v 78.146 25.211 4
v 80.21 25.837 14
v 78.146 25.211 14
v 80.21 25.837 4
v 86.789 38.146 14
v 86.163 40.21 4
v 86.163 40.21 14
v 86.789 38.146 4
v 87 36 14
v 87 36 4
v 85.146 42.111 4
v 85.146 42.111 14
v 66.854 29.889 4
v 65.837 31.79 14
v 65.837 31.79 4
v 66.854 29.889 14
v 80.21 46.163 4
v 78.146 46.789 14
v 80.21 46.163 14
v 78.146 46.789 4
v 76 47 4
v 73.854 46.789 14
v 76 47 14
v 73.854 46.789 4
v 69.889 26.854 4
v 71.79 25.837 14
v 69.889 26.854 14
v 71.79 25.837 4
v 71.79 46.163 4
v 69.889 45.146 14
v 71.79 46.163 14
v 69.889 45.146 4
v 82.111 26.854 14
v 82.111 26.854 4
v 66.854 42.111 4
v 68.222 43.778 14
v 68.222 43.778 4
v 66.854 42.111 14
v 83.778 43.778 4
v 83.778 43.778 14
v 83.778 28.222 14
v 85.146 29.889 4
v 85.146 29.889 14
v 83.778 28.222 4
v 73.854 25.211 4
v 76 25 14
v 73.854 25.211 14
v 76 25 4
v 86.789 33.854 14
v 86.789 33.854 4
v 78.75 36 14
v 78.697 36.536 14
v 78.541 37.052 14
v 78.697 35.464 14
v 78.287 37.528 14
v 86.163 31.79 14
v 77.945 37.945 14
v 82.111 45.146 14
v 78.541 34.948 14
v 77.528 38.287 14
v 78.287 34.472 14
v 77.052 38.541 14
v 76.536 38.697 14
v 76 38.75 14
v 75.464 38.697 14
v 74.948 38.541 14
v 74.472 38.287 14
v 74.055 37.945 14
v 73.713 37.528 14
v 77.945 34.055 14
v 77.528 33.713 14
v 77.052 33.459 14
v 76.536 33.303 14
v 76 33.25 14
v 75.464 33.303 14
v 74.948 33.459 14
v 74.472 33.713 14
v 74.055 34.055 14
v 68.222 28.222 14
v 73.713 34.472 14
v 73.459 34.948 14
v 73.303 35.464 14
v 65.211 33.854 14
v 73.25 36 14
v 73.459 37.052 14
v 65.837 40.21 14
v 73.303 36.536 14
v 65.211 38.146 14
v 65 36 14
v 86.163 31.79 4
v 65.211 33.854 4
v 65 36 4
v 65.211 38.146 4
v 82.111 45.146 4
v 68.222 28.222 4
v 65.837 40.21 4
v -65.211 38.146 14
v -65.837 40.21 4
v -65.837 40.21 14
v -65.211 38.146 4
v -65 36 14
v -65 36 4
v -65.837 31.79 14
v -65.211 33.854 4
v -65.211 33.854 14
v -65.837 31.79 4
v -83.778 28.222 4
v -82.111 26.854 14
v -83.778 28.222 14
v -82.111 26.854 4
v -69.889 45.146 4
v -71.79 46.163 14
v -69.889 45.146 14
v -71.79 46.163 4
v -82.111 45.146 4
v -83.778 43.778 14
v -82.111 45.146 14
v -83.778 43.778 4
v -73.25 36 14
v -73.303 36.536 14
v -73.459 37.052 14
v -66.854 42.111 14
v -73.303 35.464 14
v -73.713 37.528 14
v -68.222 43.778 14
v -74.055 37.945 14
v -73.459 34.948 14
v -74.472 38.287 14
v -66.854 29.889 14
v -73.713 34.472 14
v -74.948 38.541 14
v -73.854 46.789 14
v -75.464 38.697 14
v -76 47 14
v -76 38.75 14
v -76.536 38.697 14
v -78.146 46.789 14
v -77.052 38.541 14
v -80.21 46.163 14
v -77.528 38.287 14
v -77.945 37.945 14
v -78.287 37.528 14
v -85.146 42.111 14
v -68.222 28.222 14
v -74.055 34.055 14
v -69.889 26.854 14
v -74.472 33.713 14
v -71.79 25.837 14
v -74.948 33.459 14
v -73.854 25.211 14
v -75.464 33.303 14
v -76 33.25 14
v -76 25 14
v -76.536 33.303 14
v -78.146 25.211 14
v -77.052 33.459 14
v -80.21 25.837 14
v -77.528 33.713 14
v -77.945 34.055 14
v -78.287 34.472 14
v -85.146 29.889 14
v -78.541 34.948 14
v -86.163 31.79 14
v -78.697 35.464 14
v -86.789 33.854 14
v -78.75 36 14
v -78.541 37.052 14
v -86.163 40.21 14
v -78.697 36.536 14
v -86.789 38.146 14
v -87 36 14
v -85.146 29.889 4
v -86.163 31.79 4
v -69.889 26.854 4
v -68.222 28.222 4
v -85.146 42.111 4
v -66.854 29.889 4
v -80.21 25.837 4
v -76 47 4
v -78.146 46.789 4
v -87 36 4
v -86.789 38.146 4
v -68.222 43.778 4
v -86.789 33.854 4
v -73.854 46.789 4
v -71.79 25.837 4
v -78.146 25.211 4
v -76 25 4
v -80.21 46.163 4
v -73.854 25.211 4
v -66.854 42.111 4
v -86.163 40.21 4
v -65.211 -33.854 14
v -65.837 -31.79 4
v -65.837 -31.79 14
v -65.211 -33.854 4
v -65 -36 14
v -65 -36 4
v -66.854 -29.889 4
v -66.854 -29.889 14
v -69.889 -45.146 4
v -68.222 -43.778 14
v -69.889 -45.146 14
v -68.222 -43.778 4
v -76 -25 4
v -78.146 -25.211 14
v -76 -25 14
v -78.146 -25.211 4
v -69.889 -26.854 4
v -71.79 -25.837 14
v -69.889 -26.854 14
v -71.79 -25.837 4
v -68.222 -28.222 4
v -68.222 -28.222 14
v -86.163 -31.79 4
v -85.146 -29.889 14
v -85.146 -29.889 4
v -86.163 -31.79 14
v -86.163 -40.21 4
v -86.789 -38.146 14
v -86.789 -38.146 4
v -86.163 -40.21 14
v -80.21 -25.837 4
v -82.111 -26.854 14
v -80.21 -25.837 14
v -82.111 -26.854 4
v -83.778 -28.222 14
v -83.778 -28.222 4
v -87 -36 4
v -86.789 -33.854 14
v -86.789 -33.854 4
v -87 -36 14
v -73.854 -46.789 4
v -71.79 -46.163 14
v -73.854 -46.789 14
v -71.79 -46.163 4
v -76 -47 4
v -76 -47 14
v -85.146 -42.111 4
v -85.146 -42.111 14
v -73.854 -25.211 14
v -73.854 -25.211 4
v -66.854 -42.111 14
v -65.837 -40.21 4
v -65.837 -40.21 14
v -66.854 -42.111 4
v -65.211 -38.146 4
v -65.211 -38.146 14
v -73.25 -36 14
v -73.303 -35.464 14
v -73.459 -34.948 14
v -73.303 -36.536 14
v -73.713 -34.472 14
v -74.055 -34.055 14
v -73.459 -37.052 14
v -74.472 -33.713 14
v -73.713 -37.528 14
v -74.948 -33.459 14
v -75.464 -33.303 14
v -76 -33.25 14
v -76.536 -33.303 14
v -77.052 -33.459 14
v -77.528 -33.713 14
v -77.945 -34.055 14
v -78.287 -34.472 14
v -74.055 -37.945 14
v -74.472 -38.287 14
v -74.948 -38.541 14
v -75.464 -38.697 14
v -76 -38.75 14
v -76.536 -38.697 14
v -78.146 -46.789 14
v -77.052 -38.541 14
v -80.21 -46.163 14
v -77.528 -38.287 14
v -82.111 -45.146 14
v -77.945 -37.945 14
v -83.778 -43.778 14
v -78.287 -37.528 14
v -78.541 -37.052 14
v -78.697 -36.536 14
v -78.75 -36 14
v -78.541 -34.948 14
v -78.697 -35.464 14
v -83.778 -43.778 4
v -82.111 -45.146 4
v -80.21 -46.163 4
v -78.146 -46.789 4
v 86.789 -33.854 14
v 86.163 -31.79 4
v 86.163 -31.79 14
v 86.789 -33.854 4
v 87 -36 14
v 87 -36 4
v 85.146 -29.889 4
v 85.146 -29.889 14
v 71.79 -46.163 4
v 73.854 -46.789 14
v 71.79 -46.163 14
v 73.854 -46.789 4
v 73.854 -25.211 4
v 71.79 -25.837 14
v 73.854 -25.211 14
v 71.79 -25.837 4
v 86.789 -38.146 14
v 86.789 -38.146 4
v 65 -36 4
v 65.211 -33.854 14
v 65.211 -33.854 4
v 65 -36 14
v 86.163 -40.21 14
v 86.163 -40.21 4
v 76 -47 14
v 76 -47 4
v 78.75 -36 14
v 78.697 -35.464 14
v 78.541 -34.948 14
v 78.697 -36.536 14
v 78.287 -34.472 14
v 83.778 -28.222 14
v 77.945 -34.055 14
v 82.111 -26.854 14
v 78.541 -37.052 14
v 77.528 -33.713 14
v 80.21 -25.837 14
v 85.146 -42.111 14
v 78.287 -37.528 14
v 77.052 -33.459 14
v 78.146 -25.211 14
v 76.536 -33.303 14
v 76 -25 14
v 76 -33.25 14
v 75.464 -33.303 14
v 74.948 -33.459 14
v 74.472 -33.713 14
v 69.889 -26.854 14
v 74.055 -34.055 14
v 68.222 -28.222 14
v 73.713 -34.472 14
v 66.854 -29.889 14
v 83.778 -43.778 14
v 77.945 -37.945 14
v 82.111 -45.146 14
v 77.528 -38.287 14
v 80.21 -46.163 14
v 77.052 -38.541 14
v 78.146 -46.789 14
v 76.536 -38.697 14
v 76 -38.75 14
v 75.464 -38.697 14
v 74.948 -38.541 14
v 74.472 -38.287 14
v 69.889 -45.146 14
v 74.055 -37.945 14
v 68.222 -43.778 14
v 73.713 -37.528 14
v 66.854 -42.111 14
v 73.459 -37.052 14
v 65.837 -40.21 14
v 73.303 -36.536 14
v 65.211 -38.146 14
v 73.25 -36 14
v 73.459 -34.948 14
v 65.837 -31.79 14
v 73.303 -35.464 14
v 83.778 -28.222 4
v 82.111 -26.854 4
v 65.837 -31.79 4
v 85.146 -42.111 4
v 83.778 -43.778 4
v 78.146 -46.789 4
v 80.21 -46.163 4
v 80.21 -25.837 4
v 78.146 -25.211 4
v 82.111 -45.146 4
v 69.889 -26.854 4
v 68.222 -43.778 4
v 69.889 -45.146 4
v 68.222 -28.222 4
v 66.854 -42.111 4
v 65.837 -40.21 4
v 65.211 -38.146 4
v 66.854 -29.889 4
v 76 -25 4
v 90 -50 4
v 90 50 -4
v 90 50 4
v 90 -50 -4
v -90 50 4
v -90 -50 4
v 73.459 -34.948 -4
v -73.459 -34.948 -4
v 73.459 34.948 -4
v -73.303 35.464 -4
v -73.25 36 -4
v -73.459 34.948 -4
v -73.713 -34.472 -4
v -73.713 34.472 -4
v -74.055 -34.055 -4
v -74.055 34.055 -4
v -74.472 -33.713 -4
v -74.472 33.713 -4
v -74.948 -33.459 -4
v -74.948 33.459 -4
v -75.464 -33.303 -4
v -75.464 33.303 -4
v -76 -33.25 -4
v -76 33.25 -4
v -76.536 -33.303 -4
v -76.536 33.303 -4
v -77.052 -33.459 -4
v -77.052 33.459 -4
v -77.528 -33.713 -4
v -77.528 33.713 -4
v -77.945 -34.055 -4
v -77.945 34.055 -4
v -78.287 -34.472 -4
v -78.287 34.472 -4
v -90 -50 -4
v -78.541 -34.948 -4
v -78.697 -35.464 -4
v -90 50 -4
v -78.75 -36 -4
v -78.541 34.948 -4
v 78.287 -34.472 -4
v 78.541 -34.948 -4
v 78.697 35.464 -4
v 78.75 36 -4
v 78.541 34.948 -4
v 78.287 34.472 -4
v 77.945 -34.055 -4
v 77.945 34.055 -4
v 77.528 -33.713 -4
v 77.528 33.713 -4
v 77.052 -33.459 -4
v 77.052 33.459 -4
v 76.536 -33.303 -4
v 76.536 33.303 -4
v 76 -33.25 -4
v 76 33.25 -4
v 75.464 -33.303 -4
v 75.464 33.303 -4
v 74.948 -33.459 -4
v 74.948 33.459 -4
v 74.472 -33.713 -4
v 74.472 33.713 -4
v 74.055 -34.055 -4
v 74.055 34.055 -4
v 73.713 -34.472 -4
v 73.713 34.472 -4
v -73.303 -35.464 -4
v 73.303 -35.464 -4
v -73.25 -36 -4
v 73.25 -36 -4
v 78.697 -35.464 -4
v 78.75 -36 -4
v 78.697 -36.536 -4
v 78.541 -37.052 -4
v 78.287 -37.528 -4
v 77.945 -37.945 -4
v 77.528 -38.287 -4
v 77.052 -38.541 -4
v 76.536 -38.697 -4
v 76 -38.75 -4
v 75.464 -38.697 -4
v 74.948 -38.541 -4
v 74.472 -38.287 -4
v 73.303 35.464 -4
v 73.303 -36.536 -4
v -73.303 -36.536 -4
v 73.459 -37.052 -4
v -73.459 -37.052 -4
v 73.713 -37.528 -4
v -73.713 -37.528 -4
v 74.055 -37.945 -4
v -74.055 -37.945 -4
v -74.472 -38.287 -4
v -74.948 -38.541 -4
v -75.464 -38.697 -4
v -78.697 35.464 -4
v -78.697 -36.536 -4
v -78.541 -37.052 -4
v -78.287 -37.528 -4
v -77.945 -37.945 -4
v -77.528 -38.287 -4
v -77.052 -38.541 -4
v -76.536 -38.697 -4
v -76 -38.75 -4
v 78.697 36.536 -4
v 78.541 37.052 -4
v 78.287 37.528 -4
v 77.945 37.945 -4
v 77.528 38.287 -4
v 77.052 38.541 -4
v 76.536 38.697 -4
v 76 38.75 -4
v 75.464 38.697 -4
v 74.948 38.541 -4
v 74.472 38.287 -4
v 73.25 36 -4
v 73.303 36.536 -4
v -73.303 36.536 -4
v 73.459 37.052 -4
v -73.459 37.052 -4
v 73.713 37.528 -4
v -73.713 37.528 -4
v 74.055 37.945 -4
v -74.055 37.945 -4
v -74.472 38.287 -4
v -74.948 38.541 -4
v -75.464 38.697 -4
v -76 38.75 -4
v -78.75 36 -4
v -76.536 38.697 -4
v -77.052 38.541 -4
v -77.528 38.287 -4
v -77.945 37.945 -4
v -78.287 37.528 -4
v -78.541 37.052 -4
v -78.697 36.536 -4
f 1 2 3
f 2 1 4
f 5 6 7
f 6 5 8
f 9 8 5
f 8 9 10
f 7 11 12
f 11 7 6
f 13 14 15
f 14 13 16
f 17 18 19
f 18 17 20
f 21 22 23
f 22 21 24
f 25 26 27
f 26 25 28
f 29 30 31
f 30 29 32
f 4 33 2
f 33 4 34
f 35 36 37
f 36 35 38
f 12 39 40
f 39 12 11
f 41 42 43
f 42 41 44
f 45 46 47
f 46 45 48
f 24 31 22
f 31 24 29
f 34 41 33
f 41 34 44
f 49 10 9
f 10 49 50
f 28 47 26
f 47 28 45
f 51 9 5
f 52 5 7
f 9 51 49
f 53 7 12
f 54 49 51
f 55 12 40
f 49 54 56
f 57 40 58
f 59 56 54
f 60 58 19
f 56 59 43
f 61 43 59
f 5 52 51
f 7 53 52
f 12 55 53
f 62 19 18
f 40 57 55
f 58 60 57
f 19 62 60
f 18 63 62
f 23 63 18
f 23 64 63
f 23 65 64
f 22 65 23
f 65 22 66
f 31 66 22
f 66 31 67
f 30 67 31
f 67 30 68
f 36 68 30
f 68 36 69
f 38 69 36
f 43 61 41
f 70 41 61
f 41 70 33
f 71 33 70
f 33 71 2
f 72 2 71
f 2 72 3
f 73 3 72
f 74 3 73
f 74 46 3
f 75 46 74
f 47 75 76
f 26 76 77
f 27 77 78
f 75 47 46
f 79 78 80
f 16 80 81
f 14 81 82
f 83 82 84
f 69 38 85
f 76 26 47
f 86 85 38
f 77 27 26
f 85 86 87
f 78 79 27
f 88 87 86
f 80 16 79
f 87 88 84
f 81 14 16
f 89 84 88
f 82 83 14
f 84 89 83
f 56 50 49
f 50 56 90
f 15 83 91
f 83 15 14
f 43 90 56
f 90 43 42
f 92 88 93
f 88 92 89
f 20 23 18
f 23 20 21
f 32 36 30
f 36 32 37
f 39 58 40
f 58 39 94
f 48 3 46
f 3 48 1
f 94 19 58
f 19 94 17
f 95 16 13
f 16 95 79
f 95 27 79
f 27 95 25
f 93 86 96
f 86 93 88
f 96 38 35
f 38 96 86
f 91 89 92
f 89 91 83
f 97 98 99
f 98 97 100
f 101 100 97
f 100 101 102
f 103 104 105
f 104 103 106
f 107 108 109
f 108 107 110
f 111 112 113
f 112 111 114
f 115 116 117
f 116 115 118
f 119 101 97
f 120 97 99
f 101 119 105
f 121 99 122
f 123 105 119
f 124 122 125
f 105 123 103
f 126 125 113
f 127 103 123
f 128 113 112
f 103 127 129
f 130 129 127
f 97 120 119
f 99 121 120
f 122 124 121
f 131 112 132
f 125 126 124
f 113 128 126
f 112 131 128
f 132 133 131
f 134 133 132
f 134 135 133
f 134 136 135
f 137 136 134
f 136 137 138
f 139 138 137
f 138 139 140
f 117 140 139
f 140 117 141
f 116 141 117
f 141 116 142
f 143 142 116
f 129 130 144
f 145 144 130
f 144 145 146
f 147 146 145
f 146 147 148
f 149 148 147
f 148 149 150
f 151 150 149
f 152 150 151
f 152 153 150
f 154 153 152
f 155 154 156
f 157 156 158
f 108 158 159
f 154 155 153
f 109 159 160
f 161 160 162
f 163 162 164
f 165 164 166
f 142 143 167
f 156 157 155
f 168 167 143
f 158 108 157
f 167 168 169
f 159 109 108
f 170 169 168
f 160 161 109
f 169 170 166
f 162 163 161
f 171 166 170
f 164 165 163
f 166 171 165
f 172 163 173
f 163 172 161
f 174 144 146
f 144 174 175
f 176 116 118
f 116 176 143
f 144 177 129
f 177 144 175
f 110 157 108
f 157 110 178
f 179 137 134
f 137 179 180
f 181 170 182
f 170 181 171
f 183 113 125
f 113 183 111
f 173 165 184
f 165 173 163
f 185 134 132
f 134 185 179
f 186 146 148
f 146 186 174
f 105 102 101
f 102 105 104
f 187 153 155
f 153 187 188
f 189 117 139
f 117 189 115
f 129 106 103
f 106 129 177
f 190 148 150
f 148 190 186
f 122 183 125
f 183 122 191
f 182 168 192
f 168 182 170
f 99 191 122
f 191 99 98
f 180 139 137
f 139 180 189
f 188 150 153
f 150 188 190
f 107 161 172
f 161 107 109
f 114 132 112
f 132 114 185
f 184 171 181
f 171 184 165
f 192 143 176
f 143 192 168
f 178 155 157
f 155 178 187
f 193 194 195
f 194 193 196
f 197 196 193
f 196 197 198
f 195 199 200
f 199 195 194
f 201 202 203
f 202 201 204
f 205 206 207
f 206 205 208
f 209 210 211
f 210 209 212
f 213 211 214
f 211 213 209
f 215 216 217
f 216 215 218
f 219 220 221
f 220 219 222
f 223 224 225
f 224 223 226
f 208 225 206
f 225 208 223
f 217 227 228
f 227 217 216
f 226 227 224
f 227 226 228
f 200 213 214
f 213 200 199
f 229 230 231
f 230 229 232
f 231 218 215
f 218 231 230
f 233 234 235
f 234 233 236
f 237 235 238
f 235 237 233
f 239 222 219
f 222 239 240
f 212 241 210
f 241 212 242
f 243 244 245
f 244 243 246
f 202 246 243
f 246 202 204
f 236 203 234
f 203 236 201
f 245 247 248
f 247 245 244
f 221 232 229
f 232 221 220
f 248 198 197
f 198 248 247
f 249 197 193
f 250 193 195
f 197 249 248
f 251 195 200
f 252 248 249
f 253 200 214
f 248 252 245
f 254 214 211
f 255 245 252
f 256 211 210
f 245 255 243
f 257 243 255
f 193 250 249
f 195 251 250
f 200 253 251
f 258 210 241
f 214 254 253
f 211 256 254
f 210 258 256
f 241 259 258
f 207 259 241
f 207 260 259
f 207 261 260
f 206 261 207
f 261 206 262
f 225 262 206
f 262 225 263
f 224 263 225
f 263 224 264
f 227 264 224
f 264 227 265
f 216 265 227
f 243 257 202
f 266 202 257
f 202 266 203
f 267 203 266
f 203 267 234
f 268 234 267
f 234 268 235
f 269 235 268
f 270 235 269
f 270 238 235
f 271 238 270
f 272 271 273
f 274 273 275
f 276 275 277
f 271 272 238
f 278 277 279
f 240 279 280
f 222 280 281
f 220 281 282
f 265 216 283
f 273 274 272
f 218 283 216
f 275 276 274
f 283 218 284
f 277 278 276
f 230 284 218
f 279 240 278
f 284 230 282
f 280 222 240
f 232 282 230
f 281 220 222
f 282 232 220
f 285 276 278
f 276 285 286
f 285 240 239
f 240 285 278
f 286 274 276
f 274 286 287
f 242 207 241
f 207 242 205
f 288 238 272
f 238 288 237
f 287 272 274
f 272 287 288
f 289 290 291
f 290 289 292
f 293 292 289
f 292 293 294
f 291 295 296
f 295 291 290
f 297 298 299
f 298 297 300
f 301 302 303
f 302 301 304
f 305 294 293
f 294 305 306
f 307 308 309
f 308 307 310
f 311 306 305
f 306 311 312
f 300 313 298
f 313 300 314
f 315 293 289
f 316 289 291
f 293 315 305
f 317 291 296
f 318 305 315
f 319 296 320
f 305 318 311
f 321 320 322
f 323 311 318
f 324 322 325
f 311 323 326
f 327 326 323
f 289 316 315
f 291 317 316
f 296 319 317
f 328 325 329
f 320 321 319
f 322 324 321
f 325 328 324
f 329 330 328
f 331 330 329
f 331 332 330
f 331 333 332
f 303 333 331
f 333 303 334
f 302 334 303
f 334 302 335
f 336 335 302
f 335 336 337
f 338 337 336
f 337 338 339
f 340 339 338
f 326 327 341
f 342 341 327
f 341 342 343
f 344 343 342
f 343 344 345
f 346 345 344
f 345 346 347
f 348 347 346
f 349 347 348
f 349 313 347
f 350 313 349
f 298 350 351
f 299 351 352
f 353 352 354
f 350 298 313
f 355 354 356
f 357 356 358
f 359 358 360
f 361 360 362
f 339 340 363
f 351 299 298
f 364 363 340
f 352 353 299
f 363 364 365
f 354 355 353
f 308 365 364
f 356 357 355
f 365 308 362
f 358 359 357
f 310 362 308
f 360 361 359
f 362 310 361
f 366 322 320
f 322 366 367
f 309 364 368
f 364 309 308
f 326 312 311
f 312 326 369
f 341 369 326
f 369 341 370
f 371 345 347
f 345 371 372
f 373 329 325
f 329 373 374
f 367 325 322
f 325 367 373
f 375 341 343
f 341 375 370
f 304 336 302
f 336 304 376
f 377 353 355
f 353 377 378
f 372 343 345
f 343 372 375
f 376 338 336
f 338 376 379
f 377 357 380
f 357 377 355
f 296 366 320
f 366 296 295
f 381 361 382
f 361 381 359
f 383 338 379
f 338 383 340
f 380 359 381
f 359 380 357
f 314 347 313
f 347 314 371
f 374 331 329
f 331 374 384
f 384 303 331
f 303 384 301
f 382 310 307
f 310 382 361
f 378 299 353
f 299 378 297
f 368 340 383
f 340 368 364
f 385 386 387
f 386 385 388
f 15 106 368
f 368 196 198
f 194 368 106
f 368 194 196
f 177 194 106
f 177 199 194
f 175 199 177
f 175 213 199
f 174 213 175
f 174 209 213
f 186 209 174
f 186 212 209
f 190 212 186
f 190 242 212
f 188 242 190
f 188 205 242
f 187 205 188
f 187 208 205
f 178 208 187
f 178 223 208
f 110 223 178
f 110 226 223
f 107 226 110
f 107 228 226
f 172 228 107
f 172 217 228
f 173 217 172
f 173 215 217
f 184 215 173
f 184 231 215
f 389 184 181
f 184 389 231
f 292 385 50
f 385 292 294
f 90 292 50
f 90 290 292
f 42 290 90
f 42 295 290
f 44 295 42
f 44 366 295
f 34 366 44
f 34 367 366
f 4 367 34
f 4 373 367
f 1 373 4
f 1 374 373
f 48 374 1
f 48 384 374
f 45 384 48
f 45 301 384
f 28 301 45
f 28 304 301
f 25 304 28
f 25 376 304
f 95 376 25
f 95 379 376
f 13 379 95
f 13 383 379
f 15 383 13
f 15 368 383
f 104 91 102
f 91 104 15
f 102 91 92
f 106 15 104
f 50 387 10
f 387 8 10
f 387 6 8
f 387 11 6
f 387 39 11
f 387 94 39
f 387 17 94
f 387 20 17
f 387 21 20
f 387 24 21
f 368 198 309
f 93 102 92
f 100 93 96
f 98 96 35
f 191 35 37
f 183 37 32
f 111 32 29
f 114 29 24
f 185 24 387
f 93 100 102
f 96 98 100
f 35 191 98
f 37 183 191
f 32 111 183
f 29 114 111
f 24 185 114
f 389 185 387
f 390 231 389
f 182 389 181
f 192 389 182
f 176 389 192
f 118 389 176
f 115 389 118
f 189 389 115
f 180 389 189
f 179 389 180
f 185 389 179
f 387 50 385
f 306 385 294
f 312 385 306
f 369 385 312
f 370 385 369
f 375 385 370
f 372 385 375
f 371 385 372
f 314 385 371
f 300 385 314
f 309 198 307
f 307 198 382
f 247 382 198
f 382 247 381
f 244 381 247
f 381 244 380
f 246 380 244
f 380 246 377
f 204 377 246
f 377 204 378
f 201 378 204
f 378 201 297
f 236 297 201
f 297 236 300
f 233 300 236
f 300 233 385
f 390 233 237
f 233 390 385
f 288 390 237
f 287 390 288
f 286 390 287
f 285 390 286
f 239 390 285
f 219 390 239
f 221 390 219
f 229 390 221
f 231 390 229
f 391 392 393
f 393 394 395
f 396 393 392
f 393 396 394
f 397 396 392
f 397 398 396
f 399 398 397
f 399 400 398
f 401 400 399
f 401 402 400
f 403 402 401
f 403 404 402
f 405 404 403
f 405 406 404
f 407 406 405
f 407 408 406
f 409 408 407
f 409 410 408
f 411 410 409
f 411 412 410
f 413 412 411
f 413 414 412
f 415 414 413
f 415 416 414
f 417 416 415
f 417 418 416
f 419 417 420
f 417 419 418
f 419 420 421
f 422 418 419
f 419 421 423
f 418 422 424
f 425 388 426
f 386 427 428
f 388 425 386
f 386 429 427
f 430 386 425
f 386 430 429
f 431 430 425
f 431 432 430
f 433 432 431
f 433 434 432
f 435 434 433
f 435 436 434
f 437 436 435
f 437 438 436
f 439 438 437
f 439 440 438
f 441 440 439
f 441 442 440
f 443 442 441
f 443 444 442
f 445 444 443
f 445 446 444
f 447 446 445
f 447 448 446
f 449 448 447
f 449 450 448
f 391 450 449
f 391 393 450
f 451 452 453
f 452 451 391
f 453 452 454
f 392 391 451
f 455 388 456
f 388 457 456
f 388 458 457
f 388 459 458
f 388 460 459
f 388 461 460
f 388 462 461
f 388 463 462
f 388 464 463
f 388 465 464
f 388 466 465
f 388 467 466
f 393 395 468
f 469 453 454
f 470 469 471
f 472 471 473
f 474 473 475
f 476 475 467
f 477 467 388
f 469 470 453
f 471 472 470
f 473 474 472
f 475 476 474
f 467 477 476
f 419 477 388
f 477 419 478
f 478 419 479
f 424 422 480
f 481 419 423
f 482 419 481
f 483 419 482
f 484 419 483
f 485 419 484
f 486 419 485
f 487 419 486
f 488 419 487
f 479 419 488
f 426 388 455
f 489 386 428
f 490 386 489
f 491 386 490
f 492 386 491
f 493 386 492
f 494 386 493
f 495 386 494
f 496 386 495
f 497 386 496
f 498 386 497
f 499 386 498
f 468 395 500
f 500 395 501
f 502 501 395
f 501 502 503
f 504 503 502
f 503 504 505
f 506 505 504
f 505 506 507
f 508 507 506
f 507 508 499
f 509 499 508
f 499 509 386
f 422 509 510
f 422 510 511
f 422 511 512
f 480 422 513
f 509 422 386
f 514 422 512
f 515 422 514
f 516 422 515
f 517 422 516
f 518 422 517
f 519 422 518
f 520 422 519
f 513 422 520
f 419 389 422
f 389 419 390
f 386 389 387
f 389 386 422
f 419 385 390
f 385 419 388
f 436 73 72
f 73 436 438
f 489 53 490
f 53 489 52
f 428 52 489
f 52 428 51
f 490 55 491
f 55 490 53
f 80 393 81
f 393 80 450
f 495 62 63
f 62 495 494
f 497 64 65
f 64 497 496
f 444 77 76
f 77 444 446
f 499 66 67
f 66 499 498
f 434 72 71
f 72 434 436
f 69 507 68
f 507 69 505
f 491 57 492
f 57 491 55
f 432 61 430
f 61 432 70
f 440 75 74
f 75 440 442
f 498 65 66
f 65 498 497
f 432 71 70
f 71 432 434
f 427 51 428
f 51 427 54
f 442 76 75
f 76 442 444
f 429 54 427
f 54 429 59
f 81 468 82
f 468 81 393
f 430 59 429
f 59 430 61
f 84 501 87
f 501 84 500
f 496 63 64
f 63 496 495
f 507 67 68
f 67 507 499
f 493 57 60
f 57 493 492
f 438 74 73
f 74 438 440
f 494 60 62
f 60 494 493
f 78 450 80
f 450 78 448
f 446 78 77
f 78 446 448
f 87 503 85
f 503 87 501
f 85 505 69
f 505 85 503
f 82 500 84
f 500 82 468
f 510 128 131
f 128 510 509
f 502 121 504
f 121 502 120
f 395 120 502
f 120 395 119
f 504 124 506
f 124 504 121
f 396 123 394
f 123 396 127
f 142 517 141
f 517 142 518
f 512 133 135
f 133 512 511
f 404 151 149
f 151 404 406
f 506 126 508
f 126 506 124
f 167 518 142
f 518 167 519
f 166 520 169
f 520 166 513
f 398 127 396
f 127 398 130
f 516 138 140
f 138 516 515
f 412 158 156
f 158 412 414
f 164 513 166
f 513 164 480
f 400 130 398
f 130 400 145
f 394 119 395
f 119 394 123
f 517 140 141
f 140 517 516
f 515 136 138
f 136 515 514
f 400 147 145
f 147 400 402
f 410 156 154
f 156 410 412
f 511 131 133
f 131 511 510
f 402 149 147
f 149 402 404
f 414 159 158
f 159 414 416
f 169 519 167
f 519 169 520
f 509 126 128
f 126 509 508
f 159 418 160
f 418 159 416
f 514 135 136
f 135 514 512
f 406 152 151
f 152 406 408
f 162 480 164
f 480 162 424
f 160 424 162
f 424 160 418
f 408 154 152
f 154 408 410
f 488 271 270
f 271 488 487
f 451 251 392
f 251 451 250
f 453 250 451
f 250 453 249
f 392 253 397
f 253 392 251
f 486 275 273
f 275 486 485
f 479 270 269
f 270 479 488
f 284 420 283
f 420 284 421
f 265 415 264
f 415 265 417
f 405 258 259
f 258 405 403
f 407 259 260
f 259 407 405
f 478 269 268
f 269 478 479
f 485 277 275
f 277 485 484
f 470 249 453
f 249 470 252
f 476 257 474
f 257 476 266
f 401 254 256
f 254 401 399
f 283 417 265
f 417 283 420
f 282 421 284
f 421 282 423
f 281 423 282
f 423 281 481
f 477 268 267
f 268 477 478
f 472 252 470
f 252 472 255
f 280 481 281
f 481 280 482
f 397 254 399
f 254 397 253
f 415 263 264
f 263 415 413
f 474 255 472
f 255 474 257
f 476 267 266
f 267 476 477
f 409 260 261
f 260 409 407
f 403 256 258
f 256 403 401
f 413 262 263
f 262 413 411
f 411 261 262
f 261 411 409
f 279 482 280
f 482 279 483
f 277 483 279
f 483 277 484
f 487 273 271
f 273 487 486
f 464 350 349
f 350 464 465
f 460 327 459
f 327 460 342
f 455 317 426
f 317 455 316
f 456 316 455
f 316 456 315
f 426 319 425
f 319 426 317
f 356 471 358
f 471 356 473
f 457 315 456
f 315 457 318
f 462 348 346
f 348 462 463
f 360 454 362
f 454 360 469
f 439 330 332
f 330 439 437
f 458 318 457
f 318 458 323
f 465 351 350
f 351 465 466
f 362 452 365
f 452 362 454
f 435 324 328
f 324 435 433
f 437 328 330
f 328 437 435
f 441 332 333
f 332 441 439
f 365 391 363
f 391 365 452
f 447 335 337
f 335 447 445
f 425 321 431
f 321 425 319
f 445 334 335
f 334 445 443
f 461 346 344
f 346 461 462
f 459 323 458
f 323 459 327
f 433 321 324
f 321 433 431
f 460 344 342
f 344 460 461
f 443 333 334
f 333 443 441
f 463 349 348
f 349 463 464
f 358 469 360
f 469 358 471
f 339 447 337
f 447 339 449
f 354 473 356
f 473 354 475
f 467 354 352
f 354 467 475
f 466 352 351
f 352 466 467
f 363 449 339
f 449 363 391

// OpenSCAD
$fn = 32;

// ----------------------------------------------------------------------
// Anchor pads 180 x 100 x 18
// four corner bosses with anchor holes
// ----------------------------------------------------------------------

// --- parameters (mm) ---
plate = [180, 100, 8];  // base plate size (x, y, z)
pads = 4;               // boss count, one per corner
edge = 14;              // boss centre offset from the plate edge
boss_d = 22;            // boss diameter
boss_h = 10;            // boss height above the base plate
hole_d = 5.5;           // hole diameter

// --- derived feature positions (mm) ---
height = plate[2] + boss_h;      // = 18   overall height of the part
corner_x = plate[0] / 2 - edge;  // = 76   boss centre X
corner_y = plate[1] / 2 - edge;  // = 36   boss centre Y
feature_centers = [
  [corner_x, corner_y],
  [-corner_x, corner_y],
  [-corner_x, -corner_y],
  [corner_x, -corner_y]
];   // boss centres, anchor holes are drilled there

// base plate, four bosses standing on it, anchor holes all the way through
difference() {
  union() {
    cube(plate, center = true);
    for (centre = feature_centers)
      translate([centre[0], centre[1], plate[2] / 2 - 1])
        cylinder(d = boss_d, h = boss_h + 1);
  }
  for (centre = feature_centers)
    translate([centre[0], centre[1], -height])
      cylinder(d = hole_d, h = 2 * height + 2);  // through boss and plate
}
